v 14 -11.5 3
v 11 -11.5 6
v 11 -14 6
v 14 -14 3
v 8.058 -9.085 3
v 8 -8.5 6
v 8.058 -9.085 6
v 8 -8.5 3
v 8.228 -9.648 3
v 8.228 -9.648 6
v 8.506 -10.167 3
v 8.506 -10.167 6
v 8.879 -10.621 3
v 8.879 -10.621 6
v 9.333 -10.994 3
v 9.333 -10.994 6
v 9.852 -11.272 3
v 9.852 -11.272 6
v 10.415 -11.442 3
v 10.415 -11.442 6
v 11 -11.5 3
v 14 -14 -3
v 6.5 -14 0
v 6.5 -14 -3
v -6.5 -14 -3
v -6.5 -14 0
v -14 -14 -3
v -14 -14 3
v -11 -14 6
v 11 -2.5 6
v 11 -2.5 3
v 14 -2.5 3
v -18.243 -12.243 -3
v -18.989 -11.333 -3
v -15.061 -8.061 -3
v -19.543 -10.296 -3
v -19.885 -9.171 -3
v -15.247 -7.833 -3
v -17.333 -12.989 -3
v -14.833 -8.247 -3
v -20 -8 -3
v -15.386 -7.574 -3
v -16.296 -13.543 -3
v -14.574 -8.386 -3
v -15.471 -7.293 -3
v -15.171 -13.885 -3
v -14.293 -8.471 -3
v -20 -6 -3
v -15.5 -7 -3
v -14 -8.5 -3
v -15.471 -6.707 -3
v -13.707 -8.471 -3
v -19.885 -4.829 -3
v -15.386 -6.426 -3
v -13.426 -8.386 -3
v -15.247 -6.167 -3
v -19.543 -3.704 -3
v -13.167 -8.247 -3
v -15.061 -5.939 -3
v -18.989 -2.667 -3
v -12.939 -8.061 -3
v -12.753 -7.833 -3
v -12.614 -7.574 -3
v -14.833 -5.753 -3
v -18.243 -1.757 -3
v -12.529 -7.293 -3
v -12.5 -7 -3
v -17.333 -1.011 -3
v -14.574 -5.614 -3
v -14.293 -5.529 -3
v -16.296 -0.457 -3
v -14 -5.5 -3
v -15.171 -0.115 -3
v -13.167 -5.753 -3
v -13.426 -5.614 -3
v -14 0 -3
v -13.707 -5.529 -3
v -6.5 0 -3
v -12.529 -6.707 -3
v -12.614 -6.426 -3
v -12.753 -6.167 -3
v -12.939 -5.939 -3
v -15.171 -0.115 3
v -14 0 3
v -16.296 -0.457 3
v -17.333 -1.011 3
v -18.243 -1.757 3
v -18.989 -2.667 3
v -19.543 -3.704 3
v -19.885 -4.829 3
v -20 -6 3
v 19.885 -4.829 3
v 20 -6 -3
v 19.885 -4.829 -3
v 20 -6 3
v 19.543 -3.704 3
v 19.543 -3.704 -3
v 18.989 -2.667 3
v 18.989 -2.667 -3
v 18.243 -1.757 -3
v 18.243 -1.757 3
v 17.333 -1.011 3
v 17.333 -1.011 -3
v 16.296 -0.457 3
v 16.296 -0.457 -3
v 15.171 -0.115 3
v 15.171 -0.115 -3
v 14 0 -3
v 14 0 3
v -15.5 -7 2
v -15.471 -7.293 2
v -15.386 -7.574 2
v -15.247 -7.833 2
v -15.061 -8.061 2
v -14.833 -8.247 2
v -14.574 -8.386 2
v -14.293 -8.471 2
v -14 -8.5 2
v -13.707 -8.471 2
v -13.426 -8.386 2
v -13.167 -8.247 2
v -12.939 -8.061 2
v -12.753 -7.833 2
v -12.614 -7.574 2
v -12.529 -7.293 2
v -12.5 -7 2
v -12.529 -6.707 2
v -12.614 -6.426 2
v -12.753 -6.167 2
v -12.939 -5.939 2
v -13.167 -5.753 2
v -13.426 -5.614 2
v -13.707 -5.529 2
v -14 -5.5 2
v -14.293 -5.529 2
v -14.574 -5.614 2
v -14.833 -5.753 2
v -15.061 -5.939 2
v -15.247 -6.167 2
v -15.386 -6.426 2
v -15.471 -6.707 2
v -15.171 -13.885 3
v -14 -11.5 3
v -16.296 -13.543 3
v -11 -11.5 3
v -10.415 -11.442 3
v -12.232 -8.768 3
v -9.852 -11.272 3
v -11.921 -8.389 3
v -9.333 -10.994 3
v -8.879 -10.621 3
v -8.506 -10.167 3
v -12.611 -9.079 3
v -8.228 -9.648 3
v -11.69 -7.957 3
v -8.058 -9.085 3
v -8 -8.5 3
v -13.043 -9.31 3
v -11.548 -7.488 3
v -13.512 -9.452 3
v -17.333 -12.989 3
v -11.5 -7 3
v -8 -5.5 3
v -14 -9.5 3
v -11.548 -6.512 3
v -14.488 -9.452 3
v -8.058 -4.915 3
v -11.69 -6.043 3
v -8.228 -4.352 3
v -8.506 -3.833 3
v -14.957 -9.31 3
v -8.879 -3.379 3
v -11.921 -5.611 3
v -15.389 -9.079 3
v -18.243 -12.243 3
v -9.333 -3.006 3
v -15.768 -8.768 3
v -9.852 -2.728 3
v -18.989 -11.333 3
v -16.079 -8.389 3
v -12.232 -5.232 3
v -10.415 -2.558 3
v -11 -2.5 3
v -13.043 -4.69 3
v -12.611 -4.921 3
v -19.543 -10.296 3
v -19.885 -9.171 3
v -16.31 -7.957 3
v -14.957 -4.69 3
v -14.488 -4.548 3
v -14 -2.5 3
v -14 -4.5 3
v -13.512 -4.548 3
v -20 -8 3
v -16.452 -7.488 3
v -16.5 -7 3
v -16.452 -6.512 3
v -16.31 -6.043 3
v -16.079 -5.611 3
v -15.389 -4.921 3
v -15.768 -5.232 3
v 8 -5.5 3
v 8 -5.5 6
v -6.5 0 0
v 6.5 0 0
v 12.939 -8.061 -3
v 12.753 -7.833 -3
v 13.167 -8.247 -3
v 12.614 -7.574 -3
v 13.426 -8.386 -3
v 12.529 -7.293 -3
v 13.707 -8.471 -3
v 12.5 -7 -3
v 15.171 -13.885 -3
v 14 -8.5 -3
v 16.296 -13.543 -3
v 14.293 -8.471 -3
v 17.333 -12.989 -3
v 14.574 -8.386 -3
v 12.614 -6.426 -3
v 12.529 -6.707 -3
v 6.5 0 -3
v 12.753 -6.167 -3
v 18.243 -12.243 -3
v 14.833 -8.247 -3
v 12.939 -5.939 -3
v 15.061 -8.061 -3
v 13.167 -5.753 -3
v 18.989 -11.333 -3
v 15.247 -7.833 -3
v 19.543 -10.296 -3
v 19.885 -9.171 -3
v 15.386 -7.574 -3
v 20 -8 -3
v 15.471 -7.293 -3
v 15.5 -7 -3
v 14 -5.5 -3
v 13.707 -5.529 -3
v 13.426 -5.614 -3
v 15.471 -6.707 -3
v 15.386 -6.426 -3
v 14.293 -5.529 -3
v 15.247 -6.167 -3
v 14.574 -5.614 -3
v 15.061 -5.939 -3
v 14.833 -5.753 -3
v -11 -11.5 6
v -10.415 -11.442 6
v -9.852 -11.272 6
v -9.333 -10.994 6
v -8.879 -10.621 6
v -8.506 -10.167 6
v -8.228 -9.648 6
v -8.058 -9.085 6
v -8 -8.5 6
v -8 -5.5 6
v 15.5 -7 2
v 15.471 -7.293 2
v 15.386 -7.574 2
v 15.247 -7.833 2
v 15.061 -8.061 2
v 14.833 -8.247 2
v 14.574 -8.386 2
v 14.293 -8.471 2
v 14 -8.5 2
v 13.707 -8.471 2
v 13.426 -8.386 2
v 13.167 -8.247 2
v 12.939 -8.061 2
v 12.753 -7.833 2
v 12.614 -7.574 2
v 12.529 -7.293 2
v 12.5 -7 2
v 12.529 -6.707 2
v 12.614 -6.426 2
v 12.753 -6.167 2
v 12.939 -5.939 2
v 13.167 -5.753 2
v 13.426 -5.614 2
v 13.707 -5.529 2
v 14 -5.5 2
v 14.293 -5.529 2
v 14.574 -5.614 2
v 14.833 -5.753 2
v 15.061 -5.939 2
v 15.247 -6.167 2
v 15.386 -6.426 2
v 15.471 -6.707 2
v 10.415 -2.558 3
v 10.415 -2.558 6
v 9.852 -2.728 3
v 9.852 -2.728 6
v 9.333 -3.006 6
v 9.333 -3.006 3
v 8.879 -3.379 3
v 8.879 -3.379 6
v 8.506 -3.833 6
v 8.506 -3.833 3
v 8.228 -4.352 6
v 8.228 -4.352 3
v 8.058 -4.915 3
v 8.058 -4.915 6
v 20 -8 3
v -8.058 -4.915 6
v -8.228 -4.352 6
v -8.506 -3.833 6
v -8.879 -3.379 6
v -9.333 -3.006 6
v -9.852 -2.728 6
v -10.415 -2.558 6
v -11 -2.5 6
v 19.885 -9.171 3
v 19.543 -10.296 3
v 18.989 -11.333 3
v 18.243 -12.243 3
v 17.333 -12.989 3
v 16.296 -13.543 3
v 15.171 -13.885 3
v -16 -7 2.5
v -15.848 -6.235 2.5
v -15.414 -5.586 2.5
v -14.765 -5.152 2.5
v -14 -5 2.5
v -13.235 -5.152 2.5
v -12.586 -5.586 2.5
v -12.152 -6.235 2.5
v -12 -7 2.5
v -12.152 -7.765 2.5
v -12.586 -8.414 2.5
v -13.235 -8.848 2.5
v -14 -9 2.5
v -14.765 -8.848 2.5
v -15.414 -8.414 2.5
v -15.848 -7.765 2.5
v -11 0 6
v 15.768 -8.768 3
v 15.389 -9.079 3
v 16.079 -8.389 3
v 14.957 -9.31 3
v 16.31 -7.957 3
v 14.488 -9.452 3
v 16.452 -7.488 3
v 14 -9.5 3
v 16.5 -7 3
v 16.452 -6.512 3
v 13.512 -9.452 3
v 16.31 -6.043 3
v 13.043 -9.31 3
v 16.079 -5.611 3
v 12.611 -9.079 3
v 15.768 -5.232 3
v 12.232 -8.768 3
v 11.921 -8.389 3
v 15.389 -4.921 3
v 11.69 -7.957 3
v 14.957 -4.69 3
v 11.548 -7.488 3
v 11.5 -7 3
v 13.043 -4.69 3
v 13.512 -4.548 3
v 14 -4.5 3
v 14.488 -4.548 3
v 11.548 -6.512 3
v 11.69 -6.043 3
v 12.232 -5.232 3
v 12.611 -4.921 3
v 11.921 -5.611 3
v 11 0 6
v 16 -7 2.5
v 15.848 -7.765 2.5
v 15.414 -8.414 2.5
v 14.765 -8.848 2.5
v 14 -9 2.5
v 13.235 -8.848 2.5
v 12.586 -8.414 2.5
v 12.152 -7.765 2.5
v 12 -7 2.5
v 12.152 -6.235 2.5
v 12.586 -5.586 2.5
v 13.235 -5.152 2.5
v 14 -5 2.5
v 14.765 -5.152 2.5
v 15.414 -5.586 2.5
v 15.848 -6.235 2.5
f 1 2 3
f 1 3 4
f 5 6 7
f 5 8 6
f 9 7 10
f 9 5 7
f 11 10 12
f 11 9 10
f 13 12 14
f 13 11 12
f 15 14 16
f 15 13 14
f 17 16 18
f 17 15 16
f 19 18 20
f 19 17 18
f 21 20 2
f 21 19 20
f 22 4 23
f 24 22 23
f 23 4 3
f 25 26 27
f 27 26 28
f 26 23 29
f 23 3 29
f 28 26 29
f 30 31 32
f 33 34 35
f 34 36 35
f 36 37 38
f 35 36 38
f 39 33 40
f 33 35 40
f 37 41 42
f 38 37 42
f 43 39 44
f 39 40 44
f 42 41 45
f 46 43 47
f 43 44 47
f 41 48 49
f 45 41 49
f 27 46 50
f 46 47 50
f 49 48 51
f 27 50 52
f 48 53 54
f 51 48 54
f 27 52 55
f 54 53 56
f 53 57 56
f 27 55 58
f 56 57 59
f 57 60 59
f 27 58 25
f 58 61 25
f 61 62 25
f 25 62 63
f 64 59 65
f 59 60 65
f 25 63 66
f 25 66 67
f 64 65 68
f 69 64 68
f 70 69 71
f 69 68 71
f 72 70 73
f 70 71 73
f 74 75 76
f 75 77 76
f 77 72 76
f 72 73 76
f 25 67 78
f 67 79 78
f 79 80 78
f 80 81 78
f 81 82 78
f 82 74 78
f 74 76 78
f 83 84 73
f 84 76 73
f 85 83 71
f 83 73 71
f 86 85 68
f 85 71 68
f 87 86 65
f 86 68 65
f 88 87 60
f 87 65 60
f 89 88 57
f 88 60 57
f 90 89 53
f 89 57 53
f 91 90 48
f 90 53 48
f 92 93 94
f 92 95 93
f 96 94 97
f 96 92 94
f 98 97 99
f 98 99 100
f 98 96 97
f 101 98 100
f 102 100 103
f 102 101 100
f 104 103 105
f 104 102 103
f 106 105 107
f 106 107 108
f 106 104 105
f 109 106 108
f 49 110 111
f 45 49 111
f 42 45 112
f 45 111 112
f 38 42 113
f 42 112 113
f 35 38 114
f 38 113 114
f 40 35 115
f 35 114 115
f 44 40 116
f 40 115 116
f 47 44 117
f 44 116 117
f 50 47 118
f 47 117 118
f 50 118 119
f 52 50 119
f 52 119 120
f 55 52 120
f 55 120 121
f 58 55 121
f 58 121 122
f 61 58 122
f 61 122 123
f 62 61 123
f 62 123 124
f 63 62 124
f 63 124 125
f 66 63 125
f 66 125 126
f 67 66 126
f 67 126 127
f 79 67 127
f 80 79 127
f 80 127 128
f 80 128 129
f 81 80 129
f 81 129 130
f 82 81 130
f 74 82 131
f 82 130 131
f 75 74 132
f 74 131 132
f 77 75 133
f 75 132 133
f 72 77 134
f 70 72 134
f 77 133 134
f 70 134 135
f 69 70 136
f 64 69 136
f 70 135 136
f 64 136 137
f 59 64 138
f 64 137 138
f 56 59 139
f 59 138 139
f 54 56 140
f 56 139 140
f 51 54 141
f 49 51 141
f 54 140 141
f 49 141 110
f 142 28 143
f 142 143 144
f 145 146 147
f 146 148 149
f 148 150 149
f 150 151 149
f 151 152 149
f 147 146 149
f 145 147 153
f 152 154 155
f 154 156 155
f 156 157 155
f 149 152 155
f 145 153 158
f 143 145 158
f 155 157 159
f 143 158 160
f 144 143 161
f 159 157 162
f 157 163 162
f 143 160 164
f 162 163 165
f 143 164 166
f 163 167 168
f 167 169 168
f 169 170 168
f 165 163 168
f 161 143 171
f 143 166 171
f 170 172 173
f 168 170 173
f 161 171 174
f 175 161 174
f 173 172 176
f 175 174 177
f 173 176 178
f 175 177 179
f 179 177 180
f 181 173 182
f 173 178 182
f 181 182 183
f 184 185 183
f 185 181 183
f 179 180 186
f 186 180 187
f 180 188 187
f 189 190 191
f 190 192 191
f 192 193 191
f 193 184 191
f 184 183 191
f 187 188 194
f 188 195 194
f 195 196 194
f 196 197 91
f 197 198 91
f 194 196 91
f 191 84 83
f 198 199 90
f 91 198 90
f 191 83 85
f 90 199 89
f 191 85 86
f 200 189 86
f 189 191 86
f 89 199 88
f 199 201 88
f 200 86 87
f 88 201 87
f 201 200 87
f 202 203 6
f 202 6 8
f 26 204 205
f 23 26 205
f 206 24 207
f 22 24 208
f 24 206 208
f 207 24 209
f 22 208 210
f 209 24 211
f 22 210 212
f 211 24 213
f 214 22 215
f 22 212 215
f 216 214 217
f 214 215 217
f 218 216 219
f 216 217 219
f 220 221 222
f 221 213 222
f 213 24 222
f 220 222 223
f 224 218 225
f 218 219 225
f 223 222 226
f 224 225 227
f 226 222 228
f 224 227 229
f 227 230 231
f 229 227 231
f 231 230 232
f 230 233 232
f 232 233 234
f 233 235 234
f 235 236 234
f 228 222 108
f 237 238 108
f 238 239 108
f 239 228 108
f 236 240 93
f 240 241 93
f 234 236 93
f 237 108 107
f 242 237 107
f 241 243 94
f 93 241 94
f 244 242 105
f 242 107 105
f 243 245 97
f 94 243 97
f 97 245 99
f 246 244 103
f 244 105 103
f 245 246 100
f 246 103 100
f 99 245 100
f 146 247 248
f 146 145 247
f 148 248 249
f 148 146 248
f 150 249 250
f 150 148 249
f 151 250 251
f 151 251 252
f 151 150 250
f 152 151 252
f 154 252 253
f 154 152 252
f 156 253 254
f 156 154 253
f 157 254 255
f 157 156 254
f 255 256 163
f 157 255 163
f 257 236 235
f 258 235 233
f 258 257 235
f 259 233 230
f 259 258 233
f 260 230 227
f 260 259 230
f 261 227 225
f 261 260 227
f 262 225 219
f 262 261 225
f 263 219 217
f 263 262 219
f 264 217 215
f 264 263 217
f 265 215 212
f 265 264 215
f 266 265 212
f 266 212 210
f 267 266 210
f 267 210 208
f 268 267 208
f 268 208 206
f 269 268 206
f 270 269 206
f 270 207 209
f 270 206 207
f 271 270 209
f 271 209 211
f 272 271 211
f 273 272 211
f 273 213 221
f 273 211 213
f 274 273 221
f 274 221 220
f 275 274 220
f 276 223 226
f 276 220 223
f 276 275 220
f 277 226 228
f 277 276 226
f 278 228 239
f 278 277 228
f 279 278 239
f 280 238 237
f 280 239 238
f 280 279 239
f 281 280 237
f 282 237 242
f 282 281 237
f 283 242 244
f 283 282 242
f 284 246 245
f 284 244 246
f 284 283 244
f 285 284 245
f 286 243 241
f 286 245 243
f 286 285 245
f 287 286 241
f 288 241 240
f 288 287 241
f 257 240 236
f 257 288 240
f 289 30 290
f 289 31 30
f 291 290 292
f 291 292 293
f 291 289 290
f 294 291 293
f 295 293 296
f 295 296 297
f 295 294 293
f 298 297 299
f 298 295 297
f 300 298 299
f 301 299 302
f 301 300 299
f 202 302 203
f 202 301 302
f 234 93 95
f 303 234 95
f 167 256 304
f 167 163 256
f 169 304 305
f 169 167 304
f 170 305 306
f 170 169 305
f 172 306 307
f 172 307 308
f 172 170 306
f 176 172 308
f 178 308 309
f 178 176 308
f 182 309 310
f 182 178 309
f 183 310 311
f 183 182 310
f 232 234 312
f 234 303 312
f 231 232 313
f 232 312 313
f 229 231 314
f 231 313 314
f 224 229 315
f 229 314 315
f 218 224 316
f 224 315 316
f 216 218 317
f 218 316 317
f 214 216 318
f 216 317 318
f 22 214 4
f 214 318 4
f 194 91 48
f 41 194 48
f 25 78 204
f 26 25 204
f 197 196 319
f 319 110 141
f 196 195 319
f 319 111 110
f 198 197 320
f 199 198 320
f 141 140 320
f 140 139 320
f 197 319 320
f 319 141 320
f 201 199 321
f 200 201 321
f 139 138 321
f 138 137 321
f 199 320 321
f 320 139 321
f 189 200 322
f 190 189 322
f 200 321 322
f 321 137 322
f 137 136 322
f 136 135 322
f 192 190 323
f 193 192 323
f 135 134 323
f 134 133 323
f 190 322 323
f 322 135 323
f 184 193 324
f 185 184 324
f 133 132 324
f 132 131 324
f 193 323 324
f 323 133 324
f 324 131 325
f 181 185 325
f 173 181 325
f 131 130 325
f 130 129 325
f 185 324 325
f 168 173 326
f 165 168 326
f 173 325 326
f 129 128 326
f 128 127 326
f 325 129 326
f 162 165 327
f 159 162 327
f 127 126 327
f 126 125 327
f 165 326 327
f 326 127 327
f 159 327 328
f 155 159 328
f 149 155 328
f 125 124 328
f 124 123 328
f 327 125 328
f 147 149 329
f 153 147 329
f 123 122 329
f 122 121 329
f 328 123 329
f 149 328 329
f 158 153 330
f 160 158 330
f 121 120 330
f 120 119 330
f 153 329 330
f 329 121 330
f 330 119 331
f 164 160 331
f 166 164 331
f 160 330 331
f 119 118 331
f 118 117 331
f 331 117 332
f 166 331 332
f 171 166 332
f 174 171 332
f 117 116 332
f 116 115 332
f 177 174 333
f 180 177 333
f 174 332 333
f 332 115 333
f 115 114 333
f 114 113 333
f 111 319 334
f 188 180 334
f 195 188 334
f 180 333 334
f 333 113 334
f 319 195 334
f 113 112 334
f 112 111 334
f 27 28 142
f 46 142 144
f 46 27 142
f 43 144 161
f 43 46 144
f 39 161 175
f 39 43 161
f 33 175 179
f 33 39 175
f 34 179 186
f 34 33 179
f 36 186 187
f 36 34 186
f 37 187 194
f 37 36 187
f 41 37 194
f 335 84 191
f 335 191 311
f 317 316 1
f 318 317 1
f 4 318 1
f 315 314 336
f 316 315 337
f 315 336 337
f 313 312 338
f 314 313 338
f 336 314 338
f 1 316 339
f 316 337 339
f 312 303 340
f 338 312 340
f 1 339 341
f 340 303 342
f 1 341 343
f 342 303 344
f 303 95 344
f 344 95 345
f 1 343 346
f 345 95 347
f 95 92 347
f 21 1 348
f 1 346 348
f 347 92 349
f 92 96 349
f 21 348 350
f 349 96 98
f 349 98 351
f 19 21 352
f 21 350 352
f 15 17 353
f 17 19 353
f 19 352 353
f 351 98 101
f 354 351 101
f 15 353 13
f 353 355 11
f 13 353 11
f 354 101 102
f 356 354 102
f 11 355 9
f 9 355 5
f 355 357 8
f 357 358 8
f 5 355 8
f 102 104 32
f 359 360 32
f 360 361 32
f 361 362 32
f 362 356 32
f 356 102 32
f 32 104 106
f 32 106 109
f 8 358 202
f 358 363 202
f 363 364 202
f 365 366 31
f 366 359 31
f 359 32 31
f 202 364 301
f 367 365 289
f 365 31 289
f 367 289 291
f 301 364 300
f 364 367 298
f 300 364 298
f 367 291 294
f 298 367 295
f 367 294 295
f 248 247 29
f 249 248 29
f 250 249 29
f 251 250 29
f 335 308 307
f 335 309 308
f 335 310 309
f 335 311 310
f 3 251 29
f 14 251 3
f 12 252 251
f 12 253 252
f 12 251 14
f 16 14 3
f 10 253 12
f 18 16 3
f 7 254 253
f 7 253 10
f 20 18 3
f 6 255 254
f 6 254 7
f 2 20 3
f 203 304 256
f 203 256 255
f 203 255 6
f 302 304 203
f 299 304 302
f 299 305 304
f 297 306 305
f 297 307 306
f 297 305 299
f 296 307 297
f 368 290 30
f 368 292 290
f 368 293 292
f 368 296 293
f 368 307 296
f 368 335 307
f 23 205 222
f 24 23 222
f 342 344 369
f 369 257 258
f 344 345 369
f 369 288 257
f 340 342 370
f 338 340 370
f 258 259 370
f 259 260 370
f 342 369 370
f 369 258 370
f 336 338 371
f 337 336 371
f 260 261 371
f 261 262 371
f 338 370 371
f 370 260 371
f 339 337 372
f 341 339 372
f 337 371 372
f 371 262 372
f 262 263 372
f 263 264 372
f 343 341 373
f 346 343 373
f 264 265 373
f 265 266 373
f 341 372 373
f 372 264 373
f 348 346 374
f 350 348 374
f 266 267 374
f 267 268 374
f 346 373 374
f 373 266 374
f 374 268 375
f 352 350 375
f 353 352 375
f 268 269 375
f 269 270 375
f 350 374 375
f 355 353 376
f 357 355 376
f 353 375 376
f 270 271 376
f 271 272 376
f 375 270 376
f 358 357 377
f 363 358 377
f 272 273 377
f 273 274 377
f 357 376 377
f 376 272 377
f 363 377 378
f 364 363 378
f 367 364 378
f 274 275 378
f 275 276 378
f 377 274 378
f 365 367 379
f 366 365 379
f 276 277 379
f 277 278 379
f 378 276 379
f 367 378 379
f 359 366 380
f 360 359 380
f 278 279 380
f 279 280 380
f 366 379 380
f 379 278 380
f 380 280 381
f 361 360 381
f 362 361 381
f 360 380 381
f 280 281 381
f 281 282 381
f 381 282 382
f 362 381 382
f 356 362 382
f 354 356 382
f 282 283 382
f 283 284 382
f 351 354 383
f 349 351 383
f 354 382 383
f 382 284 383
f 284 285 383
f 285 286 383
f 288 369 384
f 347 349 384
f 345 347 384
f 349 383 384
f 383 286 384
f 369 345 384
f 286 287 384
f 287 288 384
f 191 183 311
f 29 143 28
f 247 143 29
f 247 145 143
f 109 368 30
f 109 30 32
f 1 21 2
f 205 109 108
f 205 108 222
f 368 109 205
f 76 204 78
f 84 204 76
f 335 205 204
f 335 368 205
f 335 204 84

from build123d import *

# Parameters (mm, degrees)
PAD_DEPTH       = 14
SKETCH001_R     = 1.5
POCKET_DEPTH    = 91.604738
FILLET_R        = 6
PAD001_DEPTH    = 14
SKETCH003_W     = 12
SKETCH003_H     = 8.899188
POCKET001_DEPTH = 4.5
FILLET001_R     = 3
CHAMFER_SIZE    = 1


with BuildPart() as part:
    # Sketch → Pad (new body)
    with BuildSketch(Plane.XZ):
        Polygon((20, -3), (20, 3), (-20, 3), (-20, -3), (-6.5, -3), (-6.5, 0), (6.5, 0), (6.5, -3), align=None)
    extrude(amount=PAD_DEPTH)

    # Sketch001 (on DatumPlane) → Pocket (cut, through all)
    with BuildSketch(Plane(origin=(0, 0, 3), x_dir=(-1, 0, 0), z_dir=(0, 0, 1))):
        with Locations((14, 7)):
            Circle(SKETCH001_R)
    pocket = extrude(amount=-POCKET_DEPTH, mode=Mode.SUBTRACT)

    # Mirrored: Pocket across Sketch001 V_Axis
    add(pocket.mirror(Plane(origin=(0, 0, 3), x_dir=(0, 0, 1), z_dir=(-1, 0, 0))), mode=Mode.SUBTRACT)

    # Fillet
    fillet_edges = [part.edges().sort_by_distance(p)[0] for p in [
        (-20, -14, 0),
        (20, -14, 0),
        (20, 0, 0),
        (-20, 0, 0),
    ]]
    fillet(fillet_edges, radius=FILLET_R)

    # Sketch002 → Pad001 (join)
    with BuildSketch(Plane.XZ):
        Polygon((-14, 3), (-11, 6), (11, 6), (14, 3), align=None)
    extrude(amount=PAD001_DEPTH)

    # Sketch003 (on DatumPlane) → Pocket001 (cut, symmetric)
    with BuildSketch(Plane(origin=(0, -7, 0), x_dir=(1, 0, 0), z_dir=(0, 1, 0))):
        with Locations((14, -7.449594)):
            Rectangle(SKETCH003_W, SKETCH003_H)
    pocket001 = extrude(amount=POCKET001_DEPTH, both=True, mode=Mode.SUBTRACT)

    # Mirrored001: Pocket001 across Sketch003 V_Axis
    add(pocket001.mirror(Plane(origin=(0, -7, 0), x_dir=(0, 1, 0), z_dir=(1, 0, 0))), mode=Mode.SUBTRACT)

    # Fillet001
    fillet001_edges = [part.edges().sort_by_distance(p)[0] for p in [
        (-8, -11.5, 4.5),
        (8, -11.5, 4.5),
        (-8, -2.5, 4.5),
        (8, -2.5, 4.5),
    ]]
    fillet(fillet001_edges, radius=FILLET001_R)

    # Chamfer
    chamfer_edges = [part.edges().sort_by_distance(p)[0] for p in [
        (-15.06066, -5.93934, 3),
        (12.5, -7, 3),
    ]]
    chamfer(chamfer_edges, length=CHAMFER_SIZE)


solid = part.part
